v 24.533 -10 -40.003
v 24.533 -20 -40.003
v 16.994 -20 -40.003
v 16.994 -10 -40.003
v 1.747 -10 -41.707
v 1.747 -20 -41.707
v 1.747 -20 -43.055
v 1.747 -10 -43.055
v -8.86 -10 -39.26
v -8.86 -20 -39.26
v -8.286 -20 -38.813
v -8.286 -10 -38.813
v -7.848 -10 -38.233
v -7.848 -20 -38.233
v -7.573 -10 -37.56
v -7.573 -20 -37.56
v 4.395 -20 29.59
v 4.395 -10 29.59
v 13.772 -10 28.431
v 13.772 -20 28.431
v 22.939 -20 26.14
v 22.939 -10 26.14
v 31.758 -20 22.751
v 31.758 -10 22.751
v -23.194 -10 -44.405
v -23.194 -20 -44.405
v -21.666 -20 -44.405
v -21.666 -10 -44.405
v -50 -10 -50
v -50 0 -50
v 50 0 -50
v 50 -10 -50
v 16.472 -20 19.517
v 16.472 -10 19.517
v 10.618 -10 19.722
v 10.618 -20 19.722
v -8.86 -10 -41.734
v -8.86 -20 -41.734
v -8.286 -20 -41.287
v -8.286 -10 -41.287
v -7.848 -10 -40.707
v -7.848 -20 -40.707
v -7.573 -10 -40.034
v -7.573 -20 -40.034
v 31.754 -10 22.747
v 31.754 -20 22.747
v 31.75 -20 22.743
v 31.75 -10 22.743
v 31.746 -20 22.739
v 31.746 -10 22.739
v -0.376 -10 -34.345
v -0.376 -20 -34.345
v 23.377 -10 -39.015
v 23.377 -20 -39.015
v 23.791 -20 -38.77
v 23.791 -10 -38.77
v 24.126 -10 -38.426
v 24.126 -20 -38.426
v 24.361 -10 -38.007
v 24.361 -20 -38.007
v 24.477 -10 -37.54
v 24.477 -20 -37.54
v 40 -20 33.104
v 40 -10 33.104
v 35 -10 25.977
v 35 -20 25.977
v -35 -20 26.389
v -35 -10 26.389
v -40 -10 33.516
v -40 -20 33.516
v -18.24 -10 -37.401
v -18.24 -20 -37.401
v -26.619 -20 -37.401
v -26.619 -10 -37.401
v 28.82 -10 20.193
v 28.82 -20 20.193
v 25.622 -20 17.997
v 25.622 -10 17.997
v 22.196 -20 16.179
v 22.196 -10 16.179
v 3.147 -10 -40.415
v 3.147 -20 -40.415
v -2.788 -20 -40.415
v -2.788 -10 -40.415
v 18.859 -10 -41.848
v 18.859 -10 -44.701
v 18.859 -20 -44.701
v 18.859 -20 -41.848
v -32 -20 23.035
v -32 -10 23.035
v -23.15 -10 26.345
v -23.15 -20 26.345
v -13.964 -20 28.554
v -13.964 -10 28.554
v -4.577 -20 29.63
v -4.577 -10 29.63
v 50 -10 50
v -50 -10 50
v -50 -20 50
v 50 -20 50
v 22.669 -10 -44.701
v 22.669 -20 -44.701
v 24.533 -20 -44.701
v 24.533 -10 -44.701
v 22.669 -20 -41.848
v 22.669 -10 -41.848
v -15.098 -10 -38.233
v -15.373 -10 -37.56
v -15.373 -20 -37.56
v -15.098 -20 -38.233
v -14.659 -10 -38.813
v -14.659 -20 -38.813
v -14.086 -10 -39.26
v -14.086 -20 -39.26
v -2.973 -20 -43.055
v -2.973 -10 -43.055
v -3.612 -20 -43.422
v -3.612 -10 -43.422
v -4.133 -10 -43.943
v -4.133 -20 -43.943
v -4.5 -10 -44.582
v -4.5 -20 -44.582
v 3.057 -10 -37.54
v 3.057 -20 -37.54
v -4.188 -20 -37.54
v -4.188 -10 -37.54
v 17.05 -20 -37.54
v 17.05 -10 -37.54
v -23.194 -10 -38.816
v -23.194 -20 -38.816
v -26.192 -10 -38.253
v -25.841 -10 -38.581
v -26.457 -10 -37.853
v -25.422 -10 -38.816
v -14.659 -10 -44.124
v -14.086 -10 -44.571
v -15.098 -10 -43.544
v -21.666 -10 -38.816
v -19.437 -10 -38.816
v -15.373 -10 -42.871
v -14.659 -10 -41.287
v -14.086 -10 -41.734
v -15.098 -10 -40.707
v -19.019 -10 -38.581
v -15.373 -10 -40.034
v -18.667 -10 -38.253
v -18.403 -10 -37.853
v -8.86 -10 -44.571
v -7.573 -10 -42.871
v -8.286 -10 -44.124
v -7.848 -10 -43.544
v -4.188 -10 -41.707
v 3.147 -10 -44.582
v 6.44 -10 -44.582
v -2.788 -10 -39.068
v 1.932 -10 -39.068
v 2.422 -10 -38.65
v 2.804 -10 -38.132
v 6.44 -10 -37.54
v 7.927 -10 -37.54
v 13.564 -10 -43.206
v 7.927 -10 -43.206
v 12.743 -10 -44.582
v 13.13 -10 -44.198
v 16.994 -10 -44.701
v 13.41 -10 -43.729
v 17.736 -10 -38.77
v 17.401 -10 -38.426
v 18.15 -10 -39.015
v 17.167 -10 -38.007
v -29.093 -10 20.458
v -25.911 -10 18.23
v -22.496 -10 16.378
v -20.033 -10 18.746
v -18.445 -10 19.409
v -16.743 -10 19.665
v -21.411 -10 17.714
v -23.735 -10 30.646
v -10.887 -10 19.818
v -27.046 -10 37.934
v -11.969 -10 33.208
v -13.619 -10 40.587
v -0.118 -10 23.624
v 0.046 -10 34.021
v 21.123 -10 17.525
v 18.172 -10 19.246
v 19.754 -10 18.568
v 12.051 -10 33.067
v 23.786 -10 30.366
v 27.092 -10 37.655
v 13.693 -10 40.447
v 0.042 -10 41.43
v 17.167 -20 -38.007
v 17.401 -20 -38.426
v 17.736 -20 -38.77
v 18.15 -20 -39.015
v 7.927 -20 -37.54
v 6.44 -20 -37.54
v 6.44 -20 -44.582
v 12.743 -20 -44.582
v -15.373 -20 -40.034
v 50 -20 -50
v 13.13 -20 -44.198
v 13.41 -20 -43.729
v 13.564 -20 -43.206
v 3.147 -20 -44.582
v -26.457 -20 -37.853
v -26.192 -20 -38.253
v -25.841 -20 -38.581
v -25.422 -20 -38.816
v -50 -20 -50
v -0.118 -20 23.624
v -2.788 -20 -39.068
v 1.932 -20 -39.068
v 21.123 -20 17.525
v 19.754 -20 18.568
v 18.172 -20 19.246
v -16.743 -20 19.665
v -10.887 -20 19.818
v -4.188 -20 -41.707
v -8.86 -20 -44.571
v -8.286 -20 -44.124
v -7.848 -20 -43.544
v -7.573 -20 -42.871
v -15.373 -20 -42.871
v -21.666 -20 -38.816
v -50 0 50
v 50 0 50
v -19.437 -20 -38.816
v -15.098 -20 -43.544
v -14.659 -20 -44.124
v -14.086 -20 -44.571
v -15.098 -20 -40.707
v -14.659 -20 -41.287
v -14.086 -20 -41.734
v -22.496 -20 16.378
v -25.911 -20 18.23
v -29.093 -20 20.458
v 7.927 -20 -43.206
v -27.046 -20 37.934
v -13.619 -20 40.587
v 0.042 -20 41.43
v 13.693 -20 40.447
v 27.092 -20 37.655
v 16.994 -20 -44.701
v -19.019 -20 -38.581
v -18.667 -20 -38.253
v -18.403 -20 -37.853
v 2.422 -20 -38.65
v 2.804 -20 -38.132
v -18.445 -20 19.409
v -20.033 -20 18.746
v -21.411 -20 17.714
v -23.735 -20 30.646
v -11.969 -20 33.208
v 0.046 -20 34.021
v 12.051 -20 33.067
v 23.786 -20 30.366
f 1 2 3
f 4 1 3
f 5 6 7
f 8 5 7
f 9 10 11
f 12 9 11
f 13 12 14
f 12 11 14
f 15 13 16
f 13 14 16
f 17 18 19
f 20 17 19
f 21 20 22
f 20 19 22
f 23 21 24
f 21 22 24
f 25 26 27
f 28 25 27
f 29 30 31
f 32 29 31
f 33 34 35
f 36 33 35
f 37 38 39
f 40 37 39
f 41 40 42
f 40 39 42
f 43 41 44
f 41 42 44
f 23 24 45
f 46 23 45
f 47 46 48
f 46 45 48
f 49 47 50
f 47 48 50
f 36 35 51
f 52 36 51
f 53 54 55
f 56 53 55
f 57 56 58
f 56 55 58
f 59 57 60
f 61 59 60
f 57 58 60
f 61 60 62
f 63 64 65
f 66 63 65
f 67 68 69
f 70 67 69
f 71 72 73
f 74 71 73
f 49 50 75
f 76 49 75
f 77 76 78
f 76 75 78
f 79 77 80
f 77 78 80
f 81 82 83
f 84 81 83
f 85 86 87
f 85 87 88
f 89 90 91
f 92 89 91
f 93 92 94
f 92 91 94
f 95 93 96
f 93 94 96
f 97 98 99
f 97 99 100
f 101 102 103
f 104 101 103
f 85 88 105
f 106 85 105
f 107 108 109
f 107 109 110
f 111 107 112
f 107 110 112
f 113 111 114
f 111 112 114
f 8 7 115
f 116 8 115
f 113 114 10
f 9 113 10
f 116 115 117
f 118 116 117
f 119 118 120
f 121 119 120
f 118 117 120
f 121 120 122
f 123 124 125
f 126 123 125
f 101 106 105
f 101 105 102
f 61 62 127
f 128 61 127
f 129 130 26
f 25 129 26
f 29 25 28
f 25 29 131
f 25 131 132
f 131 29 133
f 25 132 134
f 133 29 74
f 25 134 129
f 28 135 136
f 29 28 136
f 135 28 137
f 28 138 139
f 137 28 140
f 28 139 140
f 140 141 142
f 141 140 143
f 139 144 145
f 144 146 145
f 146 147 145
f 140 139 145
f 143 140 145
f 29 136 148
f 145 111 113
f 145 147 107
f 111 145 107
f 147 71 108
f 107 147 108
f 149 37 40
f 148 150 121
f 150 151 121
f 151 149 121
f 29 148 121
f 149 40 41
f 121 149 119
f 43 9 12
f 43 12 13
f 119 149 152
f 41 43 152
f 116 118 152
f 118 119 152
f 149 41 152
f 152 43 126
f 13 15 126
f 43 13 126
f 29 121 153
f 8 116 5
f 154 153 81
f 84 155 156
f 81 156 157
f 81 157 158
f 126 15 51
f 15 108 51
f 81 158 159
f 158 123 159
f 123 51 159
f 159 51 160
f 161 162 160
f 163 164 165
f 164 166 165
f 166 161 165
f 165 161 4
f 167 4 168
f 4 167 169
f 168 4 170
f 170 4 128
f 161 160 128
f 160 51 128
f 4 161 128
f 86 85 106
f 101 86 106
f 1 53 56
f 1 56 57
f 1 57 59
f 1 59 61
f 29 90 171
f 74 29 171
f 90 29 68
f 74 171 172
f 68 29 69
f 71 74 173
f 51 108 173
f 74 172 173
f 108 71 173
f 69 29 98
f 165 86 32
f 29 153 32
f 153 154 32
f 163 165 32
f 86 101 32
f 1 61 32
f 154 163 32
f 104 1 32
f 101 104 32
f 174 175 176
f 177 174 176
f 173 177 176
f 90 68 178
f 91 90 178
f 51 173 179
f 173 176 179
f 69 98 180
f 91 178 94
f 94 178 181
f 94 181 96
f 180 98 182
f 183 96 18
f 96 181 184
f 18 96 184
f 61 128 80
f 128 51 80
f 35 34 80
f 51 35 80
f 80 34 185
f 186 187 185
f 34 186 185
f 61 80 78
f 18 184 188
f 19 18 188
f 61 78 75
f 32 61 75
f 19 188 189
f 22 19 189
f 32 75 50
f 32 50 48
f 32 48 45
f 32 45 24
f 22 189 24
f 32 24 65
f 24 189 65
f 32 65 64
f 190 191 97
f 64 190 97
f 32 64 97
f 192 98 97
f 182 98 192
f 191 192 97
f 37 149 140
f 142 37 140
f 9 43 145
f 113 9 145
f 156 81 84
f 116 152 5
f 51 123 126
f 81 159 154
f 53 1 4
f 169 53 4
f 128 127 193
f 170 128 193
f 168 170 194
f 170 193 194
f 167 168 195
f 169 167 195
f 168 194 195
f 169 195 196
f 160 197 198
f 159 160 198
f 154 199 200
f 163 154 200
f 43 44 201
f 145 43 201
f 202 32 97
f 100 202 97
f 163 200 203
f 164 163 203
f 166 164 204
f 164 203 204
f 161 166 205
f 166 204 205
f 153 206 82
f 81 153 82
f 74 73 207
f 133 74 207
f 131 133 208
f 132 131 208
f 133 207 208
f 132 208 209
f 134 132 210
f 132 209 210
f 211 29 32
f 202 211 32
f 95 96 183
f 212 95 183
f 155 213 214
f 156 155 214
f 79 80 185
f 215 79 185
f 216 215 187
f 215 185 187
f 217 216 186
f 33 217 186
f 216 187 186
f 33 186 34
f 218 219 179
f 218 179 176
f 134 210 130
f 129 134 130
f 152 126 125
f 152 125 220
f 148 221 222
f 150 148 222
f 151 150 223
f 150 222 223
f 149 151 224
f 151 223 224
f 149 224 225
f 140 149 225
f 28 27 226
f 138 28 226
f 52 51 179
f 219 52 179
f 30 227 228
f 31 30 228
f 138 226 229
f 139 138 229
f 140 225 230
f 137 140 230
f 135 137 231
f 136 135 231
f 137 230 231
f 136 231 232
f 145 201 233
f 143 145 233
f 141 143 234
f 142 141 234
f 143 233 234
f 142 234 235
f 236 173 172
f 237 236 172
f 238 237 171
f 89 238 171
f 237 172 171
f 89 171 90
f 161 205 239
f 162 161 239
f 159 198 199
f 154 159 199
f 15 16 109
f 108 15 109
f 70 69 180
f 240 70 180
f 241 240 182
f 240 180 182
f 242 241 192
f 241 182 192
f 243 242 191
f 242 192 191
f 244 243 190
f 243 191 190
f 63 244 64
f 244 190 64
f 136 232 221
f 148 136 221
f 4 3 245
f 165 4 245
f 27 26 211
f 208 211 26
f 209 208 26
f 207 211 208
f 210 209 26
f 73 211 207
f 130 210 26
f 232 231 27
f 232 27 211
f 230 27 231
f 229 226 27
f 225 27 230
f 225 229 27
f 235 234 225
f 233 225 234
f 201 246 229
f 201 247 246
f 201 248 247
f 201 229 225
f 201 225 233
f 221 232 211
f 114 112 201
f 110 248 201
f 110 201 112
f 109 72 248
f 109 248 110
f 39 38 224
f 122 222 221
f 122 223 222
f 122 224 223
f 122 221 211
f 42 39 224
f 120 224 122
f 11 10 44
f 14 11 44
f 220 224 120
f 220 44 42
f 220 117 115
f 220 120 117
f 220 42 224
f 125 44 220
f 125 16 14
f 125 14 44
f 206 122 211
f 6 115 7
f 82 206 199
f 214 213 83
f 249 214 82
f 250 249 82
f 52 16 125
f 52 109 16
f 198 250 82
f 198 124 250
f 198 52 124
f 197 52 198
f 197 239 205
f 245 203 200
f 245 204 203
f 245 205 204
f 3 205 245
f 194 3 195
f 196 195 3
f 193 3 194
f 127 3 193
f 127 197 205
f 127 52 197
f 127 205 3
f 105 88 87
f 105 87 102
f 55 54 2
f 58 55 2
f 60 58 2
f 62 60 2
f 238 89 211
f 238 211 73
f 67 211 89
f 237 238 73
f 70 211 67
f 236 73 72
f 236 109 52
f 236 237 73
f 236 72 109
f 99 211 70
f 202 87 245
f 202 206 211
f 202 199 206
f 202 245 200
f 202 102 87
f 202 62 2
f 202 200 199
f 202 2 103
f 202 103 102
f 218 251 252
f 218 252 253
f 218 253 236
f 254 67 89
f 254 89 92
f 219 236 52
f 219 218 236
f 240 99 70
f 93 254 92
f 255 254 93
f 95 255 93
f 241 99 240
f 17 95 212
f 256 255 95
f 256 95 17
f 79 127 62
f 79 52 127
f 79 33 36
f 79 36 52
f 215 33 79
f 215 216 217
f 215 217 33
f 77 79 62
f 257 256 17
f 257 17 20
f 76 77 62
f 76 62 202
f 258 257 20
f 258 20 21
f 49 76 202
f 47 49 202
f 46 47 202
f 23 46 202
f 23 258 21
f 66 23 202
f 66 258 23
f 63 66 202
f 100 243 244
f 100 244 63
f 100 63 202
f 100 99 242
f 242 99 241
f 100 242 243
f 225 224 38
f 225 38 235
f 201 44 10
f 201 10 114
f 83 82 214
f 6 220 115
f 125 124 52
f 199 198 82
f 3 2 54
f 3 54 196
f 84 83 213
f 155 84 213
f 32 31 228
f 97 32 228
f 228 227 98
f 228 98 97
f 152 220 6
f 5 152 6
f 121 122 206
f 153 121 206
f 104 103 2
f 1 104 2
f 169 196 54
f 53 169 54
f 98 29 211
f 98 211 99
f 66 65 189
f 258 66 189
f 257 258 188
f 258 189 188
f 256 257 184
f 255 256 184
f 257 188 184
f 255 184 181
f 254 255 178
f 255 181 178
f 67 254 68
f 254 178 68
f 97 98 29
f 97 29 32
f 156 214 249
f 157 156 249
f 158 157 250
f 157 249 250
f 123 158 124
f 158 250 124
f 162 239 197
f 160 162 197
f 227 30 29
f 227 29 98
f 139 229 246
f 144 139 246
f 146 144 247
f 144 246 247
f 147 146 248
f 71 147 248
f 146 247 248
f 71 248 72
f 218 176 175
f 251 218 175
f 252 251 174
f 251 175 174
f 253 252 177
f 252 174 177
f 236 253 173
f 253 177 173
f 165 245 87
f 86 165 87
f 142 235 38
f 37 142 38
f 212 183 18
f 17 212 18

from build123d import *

# Parameters (mm, degrees)
F0_W     = 100
F0_H     = 100
F1_DEPTH = 10
F2_W     = 100
F2_H     = 100
F3_DEPTH = 10
F5_DEPTH = 10


with BuildPart() as f1:
    # F0 (on Front) → F1 (new body)
    with BuildSketch(Plane.XZ):
        Rectangle(F0_W, F0_H)
    extrude(amount=F1_DEPTH)


with BuildPart() as f3:
    # F2 (on face) → F3 (new body)
    with BuildSketch(Plane.XZ.offset(10)):
        Rectangle(F2_W, F2_H)
        with BuildLine():
            ThreePointArc((-22.496123, 16.377952), (-27.533795, 19.298471), (-32, 23.034858))
            ThreePointArc((-32, 23.034858), (-18.590811, 27.58958), (-4.57697, 29.630187))
            Line((-4.57697, 29.630187), (-0.117529, 23.624356))
            Line((-0.117529, 23.624356), (4.395257, 29.590207))
            ThreePointArc((4.395257, 29.590207), (18.390357, 27.424793), (31.758422, 22.750752))
            ThreePointArc((31.758422, 22.750752), (31.752454, 22.744927), (31.746485, 22.739104))
            ThreePointArc((31.746485, 22.739104), (27.252223, 19.049593), (22.195598, 16.178807))
            ThreePointArc((22.195598, 16.178807), (19.753952, 18.568273), (16.472125, 19.517373))
            Line((16.472125, 19.517373), (10.617825, 19.722229))
            Line((10.617825, 19.722229), (-0.37584, -34.345129))
            Line((-0.37584, -34.345129), (-10.887232, 19.818055))
            Line((-10.887232, 19.818055), (-16.743125, 19.665379))
            ThreePointArc((-16.743125, 19.665379), (-20.03328, 18.745564), (-22.496123, 16.377952))
        make_face(mode=Mode.SUBTRACT)
        with BuildLine():
            ThreePointArc((-40, 33.516364), (0.041817, 41.42999), (40, 33.10436))
            Line((40, 33.10436), (35, 25.976955))
            ThreePointArc((35, 25.976955), (0.046133, 34.020994), (-35, 26.38896))
            Line((-35, 26.38896), (-40, 33.516364))
        make_face(mode=Mode.SUBTRACT)
    extrude(amount=F3_DEPTH)

    # F4 (on face) → F5 (cut)
    with BuildSketch(Plane.XZ.offset(20)):
        with BuildLine():
            Line((-18.240365, -37.401031), (-26.619467, -37.401031))
            ThreePointArc((-26.619467, -37.401031), (-26.192441, -38.253458), (-25.422453, -38.815686))
            Line((-25.422453, -38.815686), (-23.19389, -38.815686))
            Line((-23.19389, -38.815686), (-23.19389, -44.404685))
            Line((-23.19389, -44.404685), (-22.429916, -44.404685))
            Line((-22.429916, -44.404685), (-21.665942, -44.404685))
            Line((-21.665942, -44.404685), (-21.665942, -38.815686))
            Line((-21.665942, -38.815686), (-19.43738, -38.815686))
            ThreePointArc((-19.43738, -38.815686), (-18.667391, -38.253458), (-18.240365, -37.401031))
        make_face()
        with BuildLine():
            Line((-11.472773, -37.559853), (-15.372773, -37.559853))
            ThreePointArc((-15.372773, -37.559853), (-14.897399, -38.537163), (-14.085712, -39.259853))
            Line((-14.085712, -39.259853), (-11.472773, -39.259853))
            Line((-11.472773, -39.259853), (-8.859835, -39.259853))
            ThreePointArc((-8.859835, -39.259853), (-8.048148, -38.537163), (-7.572773, -37.559853))
            Line((-7.572773, -37.559853), (-11.472773, -37.559853))
        make_face()
        with BuildLine():
            Line((-11.472773, -40.034259), (-15.372773, -40.034259))
            ThreePointArc((-15.372773, -40.034259), (-14.897399, -41.01157), (-14.085712, -41.734259))
            Line((-14.085712, -41.734259), (-11.472773, -41.734259))
            Line((-11.472773, -41.734259), (-8.859835, -41.734259))
            ThreePointArc((-8.859835, -41.734259), (-8.048148, -41.01157), (-7.572773, -40.034259))
            Line((-7.572773, -40.034259), (-11.472773, -40.034259))
        make_face()
        with BuildLine():
            Line((-11.472773, -42.871185), (-15.372773, -42.871185))
            ThreePointArc((-15.372773, -42.871185), (-14.897399, -43.848496), (-14.085712, -44.571185))
            Line((-14.085712, -44.571185), (-11.472773, -44.571185))
            Line((-11.472773, -44.571185), (-8.859835, -44.571185))
            ThreePointArc((-8.859835, -44.571185), (-8.048148, -43.848496), (-7.572773, -42.871185))
            Line((-7.572773, -42.871185), (-11.472773, -42.871185))
        make_face()
        with BuildLine():
            ThreePointArc((1.932252, -39.067592), (2.627765, -38.402056), (3.056768, -37.540294))
            Line((3.056768, -37.540294), (-4.187748, -37.540294))
            Line((-4.187748, -37.540294), (-4.187748, -41.707016))
            Line((-4.187748, -41.707016), (1.746776, -41.707016))
            Line((1.746776, -41.707016), (1.746776, -43.0546))
            Line((1.746776, -43.0546), (-2.973224, -43.0546))
            ThreePointArc((-2.973224, -43.0546), (-3.889615, -43.665179), (-4.499701, -44.581897))
            Line((-4.499701, -44.581897), (3.146776, -44.581897))
            Line((3.146776, -44.581897), (3.146776, -40.415176))
            Line((3.146776, -40.415176), (-2.787748, -40.415176))
            Line((-2.787748, -40.415176), (-2.787748, -39.067592))
            Line((-2.787748, -39.067592), (1.932252, -39.067592))
        make_face()
        with BuildLine():
            Line((7.926718, -37.540294), (6.4395, -37.540294))
            Line((6.4395, -37.540294), (6.4395, -44.581897))
            Line((6.4395, -44.581897), (12.74251, -44.581897))
            ThreePointArc((12.74251, -44.581897), (13.284445, -43.972115), (13.564029, -43.205719))
            Line((13.564029, -43.205719), (7.926718, -43.205719))
            Line((7.926718, -43.205719), (7.926718, -37.540294))
        make_face()
        Polygon((24.532836, -40.002692), (20.763628, -40.002692), (16.99442, -40.002692), (16.99442, -44.700727), (18.858718, -44.700727), (18.858718, -41.84835), (20.763628, -41.84835), (22.668539, -41.84835), (22.668539, -44.700727), (24.532836, -44.700727), align=None)
        with BuildLine():
            Line((20.763628, -37.540294), (17.050337, -37.540294))
            ThreePointArc((17.050337, -37.540294), (17.40084, -38.426274), (18.150285, -39.014615))
            Line((18.150285, -39.014615), (20.763628, -39.014615))
            Line((20.763628, -39.014615), (23.376971, -39.014615))
            ThreePointArc((23.376971, -39.014615), (24.126417, -38.426274), (24.476919, -37.540294))
            Line((24.476919, -37.540294), (20.763628, -37.540294))
        make_face()
    extrude(amount=-F5_DEPTH, mode=Mode.SUBTRACT)


solid = Compound([f1.part, f3.part])
